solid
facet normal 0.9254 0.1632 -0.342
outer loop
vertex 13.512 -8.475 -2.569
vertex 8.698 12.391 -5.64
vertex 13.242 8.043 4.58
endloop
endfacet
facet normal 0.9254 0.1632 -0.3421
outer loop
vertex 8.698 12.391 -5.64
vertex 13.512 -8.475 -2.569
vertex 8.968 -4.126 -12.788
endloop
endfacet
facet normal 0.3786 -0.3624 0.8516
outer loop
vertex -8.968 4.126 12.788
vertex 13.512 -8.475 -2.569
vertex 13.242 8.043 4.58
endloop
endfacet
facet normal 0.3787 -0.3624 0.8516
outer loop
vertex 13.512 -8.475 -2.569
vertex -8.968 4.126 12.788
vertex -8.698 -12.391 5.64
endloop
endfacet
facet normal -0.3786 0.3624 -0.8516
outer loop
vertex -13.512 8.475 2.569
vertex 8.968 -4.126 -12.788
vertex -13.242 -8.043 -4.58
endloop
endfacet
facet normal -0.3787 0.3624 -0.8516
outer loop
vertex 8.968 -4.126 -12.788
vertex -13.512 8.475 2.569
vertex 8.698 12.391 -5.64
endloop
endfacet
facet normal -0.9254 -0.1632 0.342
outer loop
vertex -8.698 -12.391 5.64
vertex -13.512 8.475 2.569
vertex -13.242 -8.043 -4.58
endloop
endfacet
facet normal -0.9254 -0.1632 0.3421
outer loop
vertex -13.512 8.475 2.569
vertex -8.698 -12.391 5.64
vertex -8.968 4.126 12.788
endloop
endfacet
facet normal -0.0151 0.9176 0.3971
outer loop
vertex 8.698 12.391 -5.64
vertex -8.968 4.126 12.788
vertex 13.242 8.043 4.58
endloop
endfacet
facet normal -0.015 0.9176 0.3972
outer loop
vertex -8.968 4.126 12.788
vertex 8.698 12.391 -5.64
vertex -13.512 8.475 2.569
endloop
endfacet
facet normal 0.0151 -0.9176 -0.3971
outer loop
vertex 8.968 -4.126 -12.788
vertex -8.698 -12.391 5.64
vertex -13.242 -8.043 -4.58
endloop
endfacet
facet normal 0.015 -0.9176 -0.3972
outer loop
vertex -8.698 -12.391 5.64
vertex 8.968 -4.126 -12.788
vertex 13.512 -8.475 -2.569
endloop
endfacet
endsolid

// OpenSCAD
$fn = 50;

difference() {
	union() {
		translate(v = [0, 0, 0]) {
			rotate(a = [25, 20, 10]) {
				difference() {
					union() {
						translate(v = [-12.0, -9.0, -6.0]) {
							cube(size = [24, 18, 12]);
						}
					}
					union();
				}
			}
		}
	}
	union();
}
